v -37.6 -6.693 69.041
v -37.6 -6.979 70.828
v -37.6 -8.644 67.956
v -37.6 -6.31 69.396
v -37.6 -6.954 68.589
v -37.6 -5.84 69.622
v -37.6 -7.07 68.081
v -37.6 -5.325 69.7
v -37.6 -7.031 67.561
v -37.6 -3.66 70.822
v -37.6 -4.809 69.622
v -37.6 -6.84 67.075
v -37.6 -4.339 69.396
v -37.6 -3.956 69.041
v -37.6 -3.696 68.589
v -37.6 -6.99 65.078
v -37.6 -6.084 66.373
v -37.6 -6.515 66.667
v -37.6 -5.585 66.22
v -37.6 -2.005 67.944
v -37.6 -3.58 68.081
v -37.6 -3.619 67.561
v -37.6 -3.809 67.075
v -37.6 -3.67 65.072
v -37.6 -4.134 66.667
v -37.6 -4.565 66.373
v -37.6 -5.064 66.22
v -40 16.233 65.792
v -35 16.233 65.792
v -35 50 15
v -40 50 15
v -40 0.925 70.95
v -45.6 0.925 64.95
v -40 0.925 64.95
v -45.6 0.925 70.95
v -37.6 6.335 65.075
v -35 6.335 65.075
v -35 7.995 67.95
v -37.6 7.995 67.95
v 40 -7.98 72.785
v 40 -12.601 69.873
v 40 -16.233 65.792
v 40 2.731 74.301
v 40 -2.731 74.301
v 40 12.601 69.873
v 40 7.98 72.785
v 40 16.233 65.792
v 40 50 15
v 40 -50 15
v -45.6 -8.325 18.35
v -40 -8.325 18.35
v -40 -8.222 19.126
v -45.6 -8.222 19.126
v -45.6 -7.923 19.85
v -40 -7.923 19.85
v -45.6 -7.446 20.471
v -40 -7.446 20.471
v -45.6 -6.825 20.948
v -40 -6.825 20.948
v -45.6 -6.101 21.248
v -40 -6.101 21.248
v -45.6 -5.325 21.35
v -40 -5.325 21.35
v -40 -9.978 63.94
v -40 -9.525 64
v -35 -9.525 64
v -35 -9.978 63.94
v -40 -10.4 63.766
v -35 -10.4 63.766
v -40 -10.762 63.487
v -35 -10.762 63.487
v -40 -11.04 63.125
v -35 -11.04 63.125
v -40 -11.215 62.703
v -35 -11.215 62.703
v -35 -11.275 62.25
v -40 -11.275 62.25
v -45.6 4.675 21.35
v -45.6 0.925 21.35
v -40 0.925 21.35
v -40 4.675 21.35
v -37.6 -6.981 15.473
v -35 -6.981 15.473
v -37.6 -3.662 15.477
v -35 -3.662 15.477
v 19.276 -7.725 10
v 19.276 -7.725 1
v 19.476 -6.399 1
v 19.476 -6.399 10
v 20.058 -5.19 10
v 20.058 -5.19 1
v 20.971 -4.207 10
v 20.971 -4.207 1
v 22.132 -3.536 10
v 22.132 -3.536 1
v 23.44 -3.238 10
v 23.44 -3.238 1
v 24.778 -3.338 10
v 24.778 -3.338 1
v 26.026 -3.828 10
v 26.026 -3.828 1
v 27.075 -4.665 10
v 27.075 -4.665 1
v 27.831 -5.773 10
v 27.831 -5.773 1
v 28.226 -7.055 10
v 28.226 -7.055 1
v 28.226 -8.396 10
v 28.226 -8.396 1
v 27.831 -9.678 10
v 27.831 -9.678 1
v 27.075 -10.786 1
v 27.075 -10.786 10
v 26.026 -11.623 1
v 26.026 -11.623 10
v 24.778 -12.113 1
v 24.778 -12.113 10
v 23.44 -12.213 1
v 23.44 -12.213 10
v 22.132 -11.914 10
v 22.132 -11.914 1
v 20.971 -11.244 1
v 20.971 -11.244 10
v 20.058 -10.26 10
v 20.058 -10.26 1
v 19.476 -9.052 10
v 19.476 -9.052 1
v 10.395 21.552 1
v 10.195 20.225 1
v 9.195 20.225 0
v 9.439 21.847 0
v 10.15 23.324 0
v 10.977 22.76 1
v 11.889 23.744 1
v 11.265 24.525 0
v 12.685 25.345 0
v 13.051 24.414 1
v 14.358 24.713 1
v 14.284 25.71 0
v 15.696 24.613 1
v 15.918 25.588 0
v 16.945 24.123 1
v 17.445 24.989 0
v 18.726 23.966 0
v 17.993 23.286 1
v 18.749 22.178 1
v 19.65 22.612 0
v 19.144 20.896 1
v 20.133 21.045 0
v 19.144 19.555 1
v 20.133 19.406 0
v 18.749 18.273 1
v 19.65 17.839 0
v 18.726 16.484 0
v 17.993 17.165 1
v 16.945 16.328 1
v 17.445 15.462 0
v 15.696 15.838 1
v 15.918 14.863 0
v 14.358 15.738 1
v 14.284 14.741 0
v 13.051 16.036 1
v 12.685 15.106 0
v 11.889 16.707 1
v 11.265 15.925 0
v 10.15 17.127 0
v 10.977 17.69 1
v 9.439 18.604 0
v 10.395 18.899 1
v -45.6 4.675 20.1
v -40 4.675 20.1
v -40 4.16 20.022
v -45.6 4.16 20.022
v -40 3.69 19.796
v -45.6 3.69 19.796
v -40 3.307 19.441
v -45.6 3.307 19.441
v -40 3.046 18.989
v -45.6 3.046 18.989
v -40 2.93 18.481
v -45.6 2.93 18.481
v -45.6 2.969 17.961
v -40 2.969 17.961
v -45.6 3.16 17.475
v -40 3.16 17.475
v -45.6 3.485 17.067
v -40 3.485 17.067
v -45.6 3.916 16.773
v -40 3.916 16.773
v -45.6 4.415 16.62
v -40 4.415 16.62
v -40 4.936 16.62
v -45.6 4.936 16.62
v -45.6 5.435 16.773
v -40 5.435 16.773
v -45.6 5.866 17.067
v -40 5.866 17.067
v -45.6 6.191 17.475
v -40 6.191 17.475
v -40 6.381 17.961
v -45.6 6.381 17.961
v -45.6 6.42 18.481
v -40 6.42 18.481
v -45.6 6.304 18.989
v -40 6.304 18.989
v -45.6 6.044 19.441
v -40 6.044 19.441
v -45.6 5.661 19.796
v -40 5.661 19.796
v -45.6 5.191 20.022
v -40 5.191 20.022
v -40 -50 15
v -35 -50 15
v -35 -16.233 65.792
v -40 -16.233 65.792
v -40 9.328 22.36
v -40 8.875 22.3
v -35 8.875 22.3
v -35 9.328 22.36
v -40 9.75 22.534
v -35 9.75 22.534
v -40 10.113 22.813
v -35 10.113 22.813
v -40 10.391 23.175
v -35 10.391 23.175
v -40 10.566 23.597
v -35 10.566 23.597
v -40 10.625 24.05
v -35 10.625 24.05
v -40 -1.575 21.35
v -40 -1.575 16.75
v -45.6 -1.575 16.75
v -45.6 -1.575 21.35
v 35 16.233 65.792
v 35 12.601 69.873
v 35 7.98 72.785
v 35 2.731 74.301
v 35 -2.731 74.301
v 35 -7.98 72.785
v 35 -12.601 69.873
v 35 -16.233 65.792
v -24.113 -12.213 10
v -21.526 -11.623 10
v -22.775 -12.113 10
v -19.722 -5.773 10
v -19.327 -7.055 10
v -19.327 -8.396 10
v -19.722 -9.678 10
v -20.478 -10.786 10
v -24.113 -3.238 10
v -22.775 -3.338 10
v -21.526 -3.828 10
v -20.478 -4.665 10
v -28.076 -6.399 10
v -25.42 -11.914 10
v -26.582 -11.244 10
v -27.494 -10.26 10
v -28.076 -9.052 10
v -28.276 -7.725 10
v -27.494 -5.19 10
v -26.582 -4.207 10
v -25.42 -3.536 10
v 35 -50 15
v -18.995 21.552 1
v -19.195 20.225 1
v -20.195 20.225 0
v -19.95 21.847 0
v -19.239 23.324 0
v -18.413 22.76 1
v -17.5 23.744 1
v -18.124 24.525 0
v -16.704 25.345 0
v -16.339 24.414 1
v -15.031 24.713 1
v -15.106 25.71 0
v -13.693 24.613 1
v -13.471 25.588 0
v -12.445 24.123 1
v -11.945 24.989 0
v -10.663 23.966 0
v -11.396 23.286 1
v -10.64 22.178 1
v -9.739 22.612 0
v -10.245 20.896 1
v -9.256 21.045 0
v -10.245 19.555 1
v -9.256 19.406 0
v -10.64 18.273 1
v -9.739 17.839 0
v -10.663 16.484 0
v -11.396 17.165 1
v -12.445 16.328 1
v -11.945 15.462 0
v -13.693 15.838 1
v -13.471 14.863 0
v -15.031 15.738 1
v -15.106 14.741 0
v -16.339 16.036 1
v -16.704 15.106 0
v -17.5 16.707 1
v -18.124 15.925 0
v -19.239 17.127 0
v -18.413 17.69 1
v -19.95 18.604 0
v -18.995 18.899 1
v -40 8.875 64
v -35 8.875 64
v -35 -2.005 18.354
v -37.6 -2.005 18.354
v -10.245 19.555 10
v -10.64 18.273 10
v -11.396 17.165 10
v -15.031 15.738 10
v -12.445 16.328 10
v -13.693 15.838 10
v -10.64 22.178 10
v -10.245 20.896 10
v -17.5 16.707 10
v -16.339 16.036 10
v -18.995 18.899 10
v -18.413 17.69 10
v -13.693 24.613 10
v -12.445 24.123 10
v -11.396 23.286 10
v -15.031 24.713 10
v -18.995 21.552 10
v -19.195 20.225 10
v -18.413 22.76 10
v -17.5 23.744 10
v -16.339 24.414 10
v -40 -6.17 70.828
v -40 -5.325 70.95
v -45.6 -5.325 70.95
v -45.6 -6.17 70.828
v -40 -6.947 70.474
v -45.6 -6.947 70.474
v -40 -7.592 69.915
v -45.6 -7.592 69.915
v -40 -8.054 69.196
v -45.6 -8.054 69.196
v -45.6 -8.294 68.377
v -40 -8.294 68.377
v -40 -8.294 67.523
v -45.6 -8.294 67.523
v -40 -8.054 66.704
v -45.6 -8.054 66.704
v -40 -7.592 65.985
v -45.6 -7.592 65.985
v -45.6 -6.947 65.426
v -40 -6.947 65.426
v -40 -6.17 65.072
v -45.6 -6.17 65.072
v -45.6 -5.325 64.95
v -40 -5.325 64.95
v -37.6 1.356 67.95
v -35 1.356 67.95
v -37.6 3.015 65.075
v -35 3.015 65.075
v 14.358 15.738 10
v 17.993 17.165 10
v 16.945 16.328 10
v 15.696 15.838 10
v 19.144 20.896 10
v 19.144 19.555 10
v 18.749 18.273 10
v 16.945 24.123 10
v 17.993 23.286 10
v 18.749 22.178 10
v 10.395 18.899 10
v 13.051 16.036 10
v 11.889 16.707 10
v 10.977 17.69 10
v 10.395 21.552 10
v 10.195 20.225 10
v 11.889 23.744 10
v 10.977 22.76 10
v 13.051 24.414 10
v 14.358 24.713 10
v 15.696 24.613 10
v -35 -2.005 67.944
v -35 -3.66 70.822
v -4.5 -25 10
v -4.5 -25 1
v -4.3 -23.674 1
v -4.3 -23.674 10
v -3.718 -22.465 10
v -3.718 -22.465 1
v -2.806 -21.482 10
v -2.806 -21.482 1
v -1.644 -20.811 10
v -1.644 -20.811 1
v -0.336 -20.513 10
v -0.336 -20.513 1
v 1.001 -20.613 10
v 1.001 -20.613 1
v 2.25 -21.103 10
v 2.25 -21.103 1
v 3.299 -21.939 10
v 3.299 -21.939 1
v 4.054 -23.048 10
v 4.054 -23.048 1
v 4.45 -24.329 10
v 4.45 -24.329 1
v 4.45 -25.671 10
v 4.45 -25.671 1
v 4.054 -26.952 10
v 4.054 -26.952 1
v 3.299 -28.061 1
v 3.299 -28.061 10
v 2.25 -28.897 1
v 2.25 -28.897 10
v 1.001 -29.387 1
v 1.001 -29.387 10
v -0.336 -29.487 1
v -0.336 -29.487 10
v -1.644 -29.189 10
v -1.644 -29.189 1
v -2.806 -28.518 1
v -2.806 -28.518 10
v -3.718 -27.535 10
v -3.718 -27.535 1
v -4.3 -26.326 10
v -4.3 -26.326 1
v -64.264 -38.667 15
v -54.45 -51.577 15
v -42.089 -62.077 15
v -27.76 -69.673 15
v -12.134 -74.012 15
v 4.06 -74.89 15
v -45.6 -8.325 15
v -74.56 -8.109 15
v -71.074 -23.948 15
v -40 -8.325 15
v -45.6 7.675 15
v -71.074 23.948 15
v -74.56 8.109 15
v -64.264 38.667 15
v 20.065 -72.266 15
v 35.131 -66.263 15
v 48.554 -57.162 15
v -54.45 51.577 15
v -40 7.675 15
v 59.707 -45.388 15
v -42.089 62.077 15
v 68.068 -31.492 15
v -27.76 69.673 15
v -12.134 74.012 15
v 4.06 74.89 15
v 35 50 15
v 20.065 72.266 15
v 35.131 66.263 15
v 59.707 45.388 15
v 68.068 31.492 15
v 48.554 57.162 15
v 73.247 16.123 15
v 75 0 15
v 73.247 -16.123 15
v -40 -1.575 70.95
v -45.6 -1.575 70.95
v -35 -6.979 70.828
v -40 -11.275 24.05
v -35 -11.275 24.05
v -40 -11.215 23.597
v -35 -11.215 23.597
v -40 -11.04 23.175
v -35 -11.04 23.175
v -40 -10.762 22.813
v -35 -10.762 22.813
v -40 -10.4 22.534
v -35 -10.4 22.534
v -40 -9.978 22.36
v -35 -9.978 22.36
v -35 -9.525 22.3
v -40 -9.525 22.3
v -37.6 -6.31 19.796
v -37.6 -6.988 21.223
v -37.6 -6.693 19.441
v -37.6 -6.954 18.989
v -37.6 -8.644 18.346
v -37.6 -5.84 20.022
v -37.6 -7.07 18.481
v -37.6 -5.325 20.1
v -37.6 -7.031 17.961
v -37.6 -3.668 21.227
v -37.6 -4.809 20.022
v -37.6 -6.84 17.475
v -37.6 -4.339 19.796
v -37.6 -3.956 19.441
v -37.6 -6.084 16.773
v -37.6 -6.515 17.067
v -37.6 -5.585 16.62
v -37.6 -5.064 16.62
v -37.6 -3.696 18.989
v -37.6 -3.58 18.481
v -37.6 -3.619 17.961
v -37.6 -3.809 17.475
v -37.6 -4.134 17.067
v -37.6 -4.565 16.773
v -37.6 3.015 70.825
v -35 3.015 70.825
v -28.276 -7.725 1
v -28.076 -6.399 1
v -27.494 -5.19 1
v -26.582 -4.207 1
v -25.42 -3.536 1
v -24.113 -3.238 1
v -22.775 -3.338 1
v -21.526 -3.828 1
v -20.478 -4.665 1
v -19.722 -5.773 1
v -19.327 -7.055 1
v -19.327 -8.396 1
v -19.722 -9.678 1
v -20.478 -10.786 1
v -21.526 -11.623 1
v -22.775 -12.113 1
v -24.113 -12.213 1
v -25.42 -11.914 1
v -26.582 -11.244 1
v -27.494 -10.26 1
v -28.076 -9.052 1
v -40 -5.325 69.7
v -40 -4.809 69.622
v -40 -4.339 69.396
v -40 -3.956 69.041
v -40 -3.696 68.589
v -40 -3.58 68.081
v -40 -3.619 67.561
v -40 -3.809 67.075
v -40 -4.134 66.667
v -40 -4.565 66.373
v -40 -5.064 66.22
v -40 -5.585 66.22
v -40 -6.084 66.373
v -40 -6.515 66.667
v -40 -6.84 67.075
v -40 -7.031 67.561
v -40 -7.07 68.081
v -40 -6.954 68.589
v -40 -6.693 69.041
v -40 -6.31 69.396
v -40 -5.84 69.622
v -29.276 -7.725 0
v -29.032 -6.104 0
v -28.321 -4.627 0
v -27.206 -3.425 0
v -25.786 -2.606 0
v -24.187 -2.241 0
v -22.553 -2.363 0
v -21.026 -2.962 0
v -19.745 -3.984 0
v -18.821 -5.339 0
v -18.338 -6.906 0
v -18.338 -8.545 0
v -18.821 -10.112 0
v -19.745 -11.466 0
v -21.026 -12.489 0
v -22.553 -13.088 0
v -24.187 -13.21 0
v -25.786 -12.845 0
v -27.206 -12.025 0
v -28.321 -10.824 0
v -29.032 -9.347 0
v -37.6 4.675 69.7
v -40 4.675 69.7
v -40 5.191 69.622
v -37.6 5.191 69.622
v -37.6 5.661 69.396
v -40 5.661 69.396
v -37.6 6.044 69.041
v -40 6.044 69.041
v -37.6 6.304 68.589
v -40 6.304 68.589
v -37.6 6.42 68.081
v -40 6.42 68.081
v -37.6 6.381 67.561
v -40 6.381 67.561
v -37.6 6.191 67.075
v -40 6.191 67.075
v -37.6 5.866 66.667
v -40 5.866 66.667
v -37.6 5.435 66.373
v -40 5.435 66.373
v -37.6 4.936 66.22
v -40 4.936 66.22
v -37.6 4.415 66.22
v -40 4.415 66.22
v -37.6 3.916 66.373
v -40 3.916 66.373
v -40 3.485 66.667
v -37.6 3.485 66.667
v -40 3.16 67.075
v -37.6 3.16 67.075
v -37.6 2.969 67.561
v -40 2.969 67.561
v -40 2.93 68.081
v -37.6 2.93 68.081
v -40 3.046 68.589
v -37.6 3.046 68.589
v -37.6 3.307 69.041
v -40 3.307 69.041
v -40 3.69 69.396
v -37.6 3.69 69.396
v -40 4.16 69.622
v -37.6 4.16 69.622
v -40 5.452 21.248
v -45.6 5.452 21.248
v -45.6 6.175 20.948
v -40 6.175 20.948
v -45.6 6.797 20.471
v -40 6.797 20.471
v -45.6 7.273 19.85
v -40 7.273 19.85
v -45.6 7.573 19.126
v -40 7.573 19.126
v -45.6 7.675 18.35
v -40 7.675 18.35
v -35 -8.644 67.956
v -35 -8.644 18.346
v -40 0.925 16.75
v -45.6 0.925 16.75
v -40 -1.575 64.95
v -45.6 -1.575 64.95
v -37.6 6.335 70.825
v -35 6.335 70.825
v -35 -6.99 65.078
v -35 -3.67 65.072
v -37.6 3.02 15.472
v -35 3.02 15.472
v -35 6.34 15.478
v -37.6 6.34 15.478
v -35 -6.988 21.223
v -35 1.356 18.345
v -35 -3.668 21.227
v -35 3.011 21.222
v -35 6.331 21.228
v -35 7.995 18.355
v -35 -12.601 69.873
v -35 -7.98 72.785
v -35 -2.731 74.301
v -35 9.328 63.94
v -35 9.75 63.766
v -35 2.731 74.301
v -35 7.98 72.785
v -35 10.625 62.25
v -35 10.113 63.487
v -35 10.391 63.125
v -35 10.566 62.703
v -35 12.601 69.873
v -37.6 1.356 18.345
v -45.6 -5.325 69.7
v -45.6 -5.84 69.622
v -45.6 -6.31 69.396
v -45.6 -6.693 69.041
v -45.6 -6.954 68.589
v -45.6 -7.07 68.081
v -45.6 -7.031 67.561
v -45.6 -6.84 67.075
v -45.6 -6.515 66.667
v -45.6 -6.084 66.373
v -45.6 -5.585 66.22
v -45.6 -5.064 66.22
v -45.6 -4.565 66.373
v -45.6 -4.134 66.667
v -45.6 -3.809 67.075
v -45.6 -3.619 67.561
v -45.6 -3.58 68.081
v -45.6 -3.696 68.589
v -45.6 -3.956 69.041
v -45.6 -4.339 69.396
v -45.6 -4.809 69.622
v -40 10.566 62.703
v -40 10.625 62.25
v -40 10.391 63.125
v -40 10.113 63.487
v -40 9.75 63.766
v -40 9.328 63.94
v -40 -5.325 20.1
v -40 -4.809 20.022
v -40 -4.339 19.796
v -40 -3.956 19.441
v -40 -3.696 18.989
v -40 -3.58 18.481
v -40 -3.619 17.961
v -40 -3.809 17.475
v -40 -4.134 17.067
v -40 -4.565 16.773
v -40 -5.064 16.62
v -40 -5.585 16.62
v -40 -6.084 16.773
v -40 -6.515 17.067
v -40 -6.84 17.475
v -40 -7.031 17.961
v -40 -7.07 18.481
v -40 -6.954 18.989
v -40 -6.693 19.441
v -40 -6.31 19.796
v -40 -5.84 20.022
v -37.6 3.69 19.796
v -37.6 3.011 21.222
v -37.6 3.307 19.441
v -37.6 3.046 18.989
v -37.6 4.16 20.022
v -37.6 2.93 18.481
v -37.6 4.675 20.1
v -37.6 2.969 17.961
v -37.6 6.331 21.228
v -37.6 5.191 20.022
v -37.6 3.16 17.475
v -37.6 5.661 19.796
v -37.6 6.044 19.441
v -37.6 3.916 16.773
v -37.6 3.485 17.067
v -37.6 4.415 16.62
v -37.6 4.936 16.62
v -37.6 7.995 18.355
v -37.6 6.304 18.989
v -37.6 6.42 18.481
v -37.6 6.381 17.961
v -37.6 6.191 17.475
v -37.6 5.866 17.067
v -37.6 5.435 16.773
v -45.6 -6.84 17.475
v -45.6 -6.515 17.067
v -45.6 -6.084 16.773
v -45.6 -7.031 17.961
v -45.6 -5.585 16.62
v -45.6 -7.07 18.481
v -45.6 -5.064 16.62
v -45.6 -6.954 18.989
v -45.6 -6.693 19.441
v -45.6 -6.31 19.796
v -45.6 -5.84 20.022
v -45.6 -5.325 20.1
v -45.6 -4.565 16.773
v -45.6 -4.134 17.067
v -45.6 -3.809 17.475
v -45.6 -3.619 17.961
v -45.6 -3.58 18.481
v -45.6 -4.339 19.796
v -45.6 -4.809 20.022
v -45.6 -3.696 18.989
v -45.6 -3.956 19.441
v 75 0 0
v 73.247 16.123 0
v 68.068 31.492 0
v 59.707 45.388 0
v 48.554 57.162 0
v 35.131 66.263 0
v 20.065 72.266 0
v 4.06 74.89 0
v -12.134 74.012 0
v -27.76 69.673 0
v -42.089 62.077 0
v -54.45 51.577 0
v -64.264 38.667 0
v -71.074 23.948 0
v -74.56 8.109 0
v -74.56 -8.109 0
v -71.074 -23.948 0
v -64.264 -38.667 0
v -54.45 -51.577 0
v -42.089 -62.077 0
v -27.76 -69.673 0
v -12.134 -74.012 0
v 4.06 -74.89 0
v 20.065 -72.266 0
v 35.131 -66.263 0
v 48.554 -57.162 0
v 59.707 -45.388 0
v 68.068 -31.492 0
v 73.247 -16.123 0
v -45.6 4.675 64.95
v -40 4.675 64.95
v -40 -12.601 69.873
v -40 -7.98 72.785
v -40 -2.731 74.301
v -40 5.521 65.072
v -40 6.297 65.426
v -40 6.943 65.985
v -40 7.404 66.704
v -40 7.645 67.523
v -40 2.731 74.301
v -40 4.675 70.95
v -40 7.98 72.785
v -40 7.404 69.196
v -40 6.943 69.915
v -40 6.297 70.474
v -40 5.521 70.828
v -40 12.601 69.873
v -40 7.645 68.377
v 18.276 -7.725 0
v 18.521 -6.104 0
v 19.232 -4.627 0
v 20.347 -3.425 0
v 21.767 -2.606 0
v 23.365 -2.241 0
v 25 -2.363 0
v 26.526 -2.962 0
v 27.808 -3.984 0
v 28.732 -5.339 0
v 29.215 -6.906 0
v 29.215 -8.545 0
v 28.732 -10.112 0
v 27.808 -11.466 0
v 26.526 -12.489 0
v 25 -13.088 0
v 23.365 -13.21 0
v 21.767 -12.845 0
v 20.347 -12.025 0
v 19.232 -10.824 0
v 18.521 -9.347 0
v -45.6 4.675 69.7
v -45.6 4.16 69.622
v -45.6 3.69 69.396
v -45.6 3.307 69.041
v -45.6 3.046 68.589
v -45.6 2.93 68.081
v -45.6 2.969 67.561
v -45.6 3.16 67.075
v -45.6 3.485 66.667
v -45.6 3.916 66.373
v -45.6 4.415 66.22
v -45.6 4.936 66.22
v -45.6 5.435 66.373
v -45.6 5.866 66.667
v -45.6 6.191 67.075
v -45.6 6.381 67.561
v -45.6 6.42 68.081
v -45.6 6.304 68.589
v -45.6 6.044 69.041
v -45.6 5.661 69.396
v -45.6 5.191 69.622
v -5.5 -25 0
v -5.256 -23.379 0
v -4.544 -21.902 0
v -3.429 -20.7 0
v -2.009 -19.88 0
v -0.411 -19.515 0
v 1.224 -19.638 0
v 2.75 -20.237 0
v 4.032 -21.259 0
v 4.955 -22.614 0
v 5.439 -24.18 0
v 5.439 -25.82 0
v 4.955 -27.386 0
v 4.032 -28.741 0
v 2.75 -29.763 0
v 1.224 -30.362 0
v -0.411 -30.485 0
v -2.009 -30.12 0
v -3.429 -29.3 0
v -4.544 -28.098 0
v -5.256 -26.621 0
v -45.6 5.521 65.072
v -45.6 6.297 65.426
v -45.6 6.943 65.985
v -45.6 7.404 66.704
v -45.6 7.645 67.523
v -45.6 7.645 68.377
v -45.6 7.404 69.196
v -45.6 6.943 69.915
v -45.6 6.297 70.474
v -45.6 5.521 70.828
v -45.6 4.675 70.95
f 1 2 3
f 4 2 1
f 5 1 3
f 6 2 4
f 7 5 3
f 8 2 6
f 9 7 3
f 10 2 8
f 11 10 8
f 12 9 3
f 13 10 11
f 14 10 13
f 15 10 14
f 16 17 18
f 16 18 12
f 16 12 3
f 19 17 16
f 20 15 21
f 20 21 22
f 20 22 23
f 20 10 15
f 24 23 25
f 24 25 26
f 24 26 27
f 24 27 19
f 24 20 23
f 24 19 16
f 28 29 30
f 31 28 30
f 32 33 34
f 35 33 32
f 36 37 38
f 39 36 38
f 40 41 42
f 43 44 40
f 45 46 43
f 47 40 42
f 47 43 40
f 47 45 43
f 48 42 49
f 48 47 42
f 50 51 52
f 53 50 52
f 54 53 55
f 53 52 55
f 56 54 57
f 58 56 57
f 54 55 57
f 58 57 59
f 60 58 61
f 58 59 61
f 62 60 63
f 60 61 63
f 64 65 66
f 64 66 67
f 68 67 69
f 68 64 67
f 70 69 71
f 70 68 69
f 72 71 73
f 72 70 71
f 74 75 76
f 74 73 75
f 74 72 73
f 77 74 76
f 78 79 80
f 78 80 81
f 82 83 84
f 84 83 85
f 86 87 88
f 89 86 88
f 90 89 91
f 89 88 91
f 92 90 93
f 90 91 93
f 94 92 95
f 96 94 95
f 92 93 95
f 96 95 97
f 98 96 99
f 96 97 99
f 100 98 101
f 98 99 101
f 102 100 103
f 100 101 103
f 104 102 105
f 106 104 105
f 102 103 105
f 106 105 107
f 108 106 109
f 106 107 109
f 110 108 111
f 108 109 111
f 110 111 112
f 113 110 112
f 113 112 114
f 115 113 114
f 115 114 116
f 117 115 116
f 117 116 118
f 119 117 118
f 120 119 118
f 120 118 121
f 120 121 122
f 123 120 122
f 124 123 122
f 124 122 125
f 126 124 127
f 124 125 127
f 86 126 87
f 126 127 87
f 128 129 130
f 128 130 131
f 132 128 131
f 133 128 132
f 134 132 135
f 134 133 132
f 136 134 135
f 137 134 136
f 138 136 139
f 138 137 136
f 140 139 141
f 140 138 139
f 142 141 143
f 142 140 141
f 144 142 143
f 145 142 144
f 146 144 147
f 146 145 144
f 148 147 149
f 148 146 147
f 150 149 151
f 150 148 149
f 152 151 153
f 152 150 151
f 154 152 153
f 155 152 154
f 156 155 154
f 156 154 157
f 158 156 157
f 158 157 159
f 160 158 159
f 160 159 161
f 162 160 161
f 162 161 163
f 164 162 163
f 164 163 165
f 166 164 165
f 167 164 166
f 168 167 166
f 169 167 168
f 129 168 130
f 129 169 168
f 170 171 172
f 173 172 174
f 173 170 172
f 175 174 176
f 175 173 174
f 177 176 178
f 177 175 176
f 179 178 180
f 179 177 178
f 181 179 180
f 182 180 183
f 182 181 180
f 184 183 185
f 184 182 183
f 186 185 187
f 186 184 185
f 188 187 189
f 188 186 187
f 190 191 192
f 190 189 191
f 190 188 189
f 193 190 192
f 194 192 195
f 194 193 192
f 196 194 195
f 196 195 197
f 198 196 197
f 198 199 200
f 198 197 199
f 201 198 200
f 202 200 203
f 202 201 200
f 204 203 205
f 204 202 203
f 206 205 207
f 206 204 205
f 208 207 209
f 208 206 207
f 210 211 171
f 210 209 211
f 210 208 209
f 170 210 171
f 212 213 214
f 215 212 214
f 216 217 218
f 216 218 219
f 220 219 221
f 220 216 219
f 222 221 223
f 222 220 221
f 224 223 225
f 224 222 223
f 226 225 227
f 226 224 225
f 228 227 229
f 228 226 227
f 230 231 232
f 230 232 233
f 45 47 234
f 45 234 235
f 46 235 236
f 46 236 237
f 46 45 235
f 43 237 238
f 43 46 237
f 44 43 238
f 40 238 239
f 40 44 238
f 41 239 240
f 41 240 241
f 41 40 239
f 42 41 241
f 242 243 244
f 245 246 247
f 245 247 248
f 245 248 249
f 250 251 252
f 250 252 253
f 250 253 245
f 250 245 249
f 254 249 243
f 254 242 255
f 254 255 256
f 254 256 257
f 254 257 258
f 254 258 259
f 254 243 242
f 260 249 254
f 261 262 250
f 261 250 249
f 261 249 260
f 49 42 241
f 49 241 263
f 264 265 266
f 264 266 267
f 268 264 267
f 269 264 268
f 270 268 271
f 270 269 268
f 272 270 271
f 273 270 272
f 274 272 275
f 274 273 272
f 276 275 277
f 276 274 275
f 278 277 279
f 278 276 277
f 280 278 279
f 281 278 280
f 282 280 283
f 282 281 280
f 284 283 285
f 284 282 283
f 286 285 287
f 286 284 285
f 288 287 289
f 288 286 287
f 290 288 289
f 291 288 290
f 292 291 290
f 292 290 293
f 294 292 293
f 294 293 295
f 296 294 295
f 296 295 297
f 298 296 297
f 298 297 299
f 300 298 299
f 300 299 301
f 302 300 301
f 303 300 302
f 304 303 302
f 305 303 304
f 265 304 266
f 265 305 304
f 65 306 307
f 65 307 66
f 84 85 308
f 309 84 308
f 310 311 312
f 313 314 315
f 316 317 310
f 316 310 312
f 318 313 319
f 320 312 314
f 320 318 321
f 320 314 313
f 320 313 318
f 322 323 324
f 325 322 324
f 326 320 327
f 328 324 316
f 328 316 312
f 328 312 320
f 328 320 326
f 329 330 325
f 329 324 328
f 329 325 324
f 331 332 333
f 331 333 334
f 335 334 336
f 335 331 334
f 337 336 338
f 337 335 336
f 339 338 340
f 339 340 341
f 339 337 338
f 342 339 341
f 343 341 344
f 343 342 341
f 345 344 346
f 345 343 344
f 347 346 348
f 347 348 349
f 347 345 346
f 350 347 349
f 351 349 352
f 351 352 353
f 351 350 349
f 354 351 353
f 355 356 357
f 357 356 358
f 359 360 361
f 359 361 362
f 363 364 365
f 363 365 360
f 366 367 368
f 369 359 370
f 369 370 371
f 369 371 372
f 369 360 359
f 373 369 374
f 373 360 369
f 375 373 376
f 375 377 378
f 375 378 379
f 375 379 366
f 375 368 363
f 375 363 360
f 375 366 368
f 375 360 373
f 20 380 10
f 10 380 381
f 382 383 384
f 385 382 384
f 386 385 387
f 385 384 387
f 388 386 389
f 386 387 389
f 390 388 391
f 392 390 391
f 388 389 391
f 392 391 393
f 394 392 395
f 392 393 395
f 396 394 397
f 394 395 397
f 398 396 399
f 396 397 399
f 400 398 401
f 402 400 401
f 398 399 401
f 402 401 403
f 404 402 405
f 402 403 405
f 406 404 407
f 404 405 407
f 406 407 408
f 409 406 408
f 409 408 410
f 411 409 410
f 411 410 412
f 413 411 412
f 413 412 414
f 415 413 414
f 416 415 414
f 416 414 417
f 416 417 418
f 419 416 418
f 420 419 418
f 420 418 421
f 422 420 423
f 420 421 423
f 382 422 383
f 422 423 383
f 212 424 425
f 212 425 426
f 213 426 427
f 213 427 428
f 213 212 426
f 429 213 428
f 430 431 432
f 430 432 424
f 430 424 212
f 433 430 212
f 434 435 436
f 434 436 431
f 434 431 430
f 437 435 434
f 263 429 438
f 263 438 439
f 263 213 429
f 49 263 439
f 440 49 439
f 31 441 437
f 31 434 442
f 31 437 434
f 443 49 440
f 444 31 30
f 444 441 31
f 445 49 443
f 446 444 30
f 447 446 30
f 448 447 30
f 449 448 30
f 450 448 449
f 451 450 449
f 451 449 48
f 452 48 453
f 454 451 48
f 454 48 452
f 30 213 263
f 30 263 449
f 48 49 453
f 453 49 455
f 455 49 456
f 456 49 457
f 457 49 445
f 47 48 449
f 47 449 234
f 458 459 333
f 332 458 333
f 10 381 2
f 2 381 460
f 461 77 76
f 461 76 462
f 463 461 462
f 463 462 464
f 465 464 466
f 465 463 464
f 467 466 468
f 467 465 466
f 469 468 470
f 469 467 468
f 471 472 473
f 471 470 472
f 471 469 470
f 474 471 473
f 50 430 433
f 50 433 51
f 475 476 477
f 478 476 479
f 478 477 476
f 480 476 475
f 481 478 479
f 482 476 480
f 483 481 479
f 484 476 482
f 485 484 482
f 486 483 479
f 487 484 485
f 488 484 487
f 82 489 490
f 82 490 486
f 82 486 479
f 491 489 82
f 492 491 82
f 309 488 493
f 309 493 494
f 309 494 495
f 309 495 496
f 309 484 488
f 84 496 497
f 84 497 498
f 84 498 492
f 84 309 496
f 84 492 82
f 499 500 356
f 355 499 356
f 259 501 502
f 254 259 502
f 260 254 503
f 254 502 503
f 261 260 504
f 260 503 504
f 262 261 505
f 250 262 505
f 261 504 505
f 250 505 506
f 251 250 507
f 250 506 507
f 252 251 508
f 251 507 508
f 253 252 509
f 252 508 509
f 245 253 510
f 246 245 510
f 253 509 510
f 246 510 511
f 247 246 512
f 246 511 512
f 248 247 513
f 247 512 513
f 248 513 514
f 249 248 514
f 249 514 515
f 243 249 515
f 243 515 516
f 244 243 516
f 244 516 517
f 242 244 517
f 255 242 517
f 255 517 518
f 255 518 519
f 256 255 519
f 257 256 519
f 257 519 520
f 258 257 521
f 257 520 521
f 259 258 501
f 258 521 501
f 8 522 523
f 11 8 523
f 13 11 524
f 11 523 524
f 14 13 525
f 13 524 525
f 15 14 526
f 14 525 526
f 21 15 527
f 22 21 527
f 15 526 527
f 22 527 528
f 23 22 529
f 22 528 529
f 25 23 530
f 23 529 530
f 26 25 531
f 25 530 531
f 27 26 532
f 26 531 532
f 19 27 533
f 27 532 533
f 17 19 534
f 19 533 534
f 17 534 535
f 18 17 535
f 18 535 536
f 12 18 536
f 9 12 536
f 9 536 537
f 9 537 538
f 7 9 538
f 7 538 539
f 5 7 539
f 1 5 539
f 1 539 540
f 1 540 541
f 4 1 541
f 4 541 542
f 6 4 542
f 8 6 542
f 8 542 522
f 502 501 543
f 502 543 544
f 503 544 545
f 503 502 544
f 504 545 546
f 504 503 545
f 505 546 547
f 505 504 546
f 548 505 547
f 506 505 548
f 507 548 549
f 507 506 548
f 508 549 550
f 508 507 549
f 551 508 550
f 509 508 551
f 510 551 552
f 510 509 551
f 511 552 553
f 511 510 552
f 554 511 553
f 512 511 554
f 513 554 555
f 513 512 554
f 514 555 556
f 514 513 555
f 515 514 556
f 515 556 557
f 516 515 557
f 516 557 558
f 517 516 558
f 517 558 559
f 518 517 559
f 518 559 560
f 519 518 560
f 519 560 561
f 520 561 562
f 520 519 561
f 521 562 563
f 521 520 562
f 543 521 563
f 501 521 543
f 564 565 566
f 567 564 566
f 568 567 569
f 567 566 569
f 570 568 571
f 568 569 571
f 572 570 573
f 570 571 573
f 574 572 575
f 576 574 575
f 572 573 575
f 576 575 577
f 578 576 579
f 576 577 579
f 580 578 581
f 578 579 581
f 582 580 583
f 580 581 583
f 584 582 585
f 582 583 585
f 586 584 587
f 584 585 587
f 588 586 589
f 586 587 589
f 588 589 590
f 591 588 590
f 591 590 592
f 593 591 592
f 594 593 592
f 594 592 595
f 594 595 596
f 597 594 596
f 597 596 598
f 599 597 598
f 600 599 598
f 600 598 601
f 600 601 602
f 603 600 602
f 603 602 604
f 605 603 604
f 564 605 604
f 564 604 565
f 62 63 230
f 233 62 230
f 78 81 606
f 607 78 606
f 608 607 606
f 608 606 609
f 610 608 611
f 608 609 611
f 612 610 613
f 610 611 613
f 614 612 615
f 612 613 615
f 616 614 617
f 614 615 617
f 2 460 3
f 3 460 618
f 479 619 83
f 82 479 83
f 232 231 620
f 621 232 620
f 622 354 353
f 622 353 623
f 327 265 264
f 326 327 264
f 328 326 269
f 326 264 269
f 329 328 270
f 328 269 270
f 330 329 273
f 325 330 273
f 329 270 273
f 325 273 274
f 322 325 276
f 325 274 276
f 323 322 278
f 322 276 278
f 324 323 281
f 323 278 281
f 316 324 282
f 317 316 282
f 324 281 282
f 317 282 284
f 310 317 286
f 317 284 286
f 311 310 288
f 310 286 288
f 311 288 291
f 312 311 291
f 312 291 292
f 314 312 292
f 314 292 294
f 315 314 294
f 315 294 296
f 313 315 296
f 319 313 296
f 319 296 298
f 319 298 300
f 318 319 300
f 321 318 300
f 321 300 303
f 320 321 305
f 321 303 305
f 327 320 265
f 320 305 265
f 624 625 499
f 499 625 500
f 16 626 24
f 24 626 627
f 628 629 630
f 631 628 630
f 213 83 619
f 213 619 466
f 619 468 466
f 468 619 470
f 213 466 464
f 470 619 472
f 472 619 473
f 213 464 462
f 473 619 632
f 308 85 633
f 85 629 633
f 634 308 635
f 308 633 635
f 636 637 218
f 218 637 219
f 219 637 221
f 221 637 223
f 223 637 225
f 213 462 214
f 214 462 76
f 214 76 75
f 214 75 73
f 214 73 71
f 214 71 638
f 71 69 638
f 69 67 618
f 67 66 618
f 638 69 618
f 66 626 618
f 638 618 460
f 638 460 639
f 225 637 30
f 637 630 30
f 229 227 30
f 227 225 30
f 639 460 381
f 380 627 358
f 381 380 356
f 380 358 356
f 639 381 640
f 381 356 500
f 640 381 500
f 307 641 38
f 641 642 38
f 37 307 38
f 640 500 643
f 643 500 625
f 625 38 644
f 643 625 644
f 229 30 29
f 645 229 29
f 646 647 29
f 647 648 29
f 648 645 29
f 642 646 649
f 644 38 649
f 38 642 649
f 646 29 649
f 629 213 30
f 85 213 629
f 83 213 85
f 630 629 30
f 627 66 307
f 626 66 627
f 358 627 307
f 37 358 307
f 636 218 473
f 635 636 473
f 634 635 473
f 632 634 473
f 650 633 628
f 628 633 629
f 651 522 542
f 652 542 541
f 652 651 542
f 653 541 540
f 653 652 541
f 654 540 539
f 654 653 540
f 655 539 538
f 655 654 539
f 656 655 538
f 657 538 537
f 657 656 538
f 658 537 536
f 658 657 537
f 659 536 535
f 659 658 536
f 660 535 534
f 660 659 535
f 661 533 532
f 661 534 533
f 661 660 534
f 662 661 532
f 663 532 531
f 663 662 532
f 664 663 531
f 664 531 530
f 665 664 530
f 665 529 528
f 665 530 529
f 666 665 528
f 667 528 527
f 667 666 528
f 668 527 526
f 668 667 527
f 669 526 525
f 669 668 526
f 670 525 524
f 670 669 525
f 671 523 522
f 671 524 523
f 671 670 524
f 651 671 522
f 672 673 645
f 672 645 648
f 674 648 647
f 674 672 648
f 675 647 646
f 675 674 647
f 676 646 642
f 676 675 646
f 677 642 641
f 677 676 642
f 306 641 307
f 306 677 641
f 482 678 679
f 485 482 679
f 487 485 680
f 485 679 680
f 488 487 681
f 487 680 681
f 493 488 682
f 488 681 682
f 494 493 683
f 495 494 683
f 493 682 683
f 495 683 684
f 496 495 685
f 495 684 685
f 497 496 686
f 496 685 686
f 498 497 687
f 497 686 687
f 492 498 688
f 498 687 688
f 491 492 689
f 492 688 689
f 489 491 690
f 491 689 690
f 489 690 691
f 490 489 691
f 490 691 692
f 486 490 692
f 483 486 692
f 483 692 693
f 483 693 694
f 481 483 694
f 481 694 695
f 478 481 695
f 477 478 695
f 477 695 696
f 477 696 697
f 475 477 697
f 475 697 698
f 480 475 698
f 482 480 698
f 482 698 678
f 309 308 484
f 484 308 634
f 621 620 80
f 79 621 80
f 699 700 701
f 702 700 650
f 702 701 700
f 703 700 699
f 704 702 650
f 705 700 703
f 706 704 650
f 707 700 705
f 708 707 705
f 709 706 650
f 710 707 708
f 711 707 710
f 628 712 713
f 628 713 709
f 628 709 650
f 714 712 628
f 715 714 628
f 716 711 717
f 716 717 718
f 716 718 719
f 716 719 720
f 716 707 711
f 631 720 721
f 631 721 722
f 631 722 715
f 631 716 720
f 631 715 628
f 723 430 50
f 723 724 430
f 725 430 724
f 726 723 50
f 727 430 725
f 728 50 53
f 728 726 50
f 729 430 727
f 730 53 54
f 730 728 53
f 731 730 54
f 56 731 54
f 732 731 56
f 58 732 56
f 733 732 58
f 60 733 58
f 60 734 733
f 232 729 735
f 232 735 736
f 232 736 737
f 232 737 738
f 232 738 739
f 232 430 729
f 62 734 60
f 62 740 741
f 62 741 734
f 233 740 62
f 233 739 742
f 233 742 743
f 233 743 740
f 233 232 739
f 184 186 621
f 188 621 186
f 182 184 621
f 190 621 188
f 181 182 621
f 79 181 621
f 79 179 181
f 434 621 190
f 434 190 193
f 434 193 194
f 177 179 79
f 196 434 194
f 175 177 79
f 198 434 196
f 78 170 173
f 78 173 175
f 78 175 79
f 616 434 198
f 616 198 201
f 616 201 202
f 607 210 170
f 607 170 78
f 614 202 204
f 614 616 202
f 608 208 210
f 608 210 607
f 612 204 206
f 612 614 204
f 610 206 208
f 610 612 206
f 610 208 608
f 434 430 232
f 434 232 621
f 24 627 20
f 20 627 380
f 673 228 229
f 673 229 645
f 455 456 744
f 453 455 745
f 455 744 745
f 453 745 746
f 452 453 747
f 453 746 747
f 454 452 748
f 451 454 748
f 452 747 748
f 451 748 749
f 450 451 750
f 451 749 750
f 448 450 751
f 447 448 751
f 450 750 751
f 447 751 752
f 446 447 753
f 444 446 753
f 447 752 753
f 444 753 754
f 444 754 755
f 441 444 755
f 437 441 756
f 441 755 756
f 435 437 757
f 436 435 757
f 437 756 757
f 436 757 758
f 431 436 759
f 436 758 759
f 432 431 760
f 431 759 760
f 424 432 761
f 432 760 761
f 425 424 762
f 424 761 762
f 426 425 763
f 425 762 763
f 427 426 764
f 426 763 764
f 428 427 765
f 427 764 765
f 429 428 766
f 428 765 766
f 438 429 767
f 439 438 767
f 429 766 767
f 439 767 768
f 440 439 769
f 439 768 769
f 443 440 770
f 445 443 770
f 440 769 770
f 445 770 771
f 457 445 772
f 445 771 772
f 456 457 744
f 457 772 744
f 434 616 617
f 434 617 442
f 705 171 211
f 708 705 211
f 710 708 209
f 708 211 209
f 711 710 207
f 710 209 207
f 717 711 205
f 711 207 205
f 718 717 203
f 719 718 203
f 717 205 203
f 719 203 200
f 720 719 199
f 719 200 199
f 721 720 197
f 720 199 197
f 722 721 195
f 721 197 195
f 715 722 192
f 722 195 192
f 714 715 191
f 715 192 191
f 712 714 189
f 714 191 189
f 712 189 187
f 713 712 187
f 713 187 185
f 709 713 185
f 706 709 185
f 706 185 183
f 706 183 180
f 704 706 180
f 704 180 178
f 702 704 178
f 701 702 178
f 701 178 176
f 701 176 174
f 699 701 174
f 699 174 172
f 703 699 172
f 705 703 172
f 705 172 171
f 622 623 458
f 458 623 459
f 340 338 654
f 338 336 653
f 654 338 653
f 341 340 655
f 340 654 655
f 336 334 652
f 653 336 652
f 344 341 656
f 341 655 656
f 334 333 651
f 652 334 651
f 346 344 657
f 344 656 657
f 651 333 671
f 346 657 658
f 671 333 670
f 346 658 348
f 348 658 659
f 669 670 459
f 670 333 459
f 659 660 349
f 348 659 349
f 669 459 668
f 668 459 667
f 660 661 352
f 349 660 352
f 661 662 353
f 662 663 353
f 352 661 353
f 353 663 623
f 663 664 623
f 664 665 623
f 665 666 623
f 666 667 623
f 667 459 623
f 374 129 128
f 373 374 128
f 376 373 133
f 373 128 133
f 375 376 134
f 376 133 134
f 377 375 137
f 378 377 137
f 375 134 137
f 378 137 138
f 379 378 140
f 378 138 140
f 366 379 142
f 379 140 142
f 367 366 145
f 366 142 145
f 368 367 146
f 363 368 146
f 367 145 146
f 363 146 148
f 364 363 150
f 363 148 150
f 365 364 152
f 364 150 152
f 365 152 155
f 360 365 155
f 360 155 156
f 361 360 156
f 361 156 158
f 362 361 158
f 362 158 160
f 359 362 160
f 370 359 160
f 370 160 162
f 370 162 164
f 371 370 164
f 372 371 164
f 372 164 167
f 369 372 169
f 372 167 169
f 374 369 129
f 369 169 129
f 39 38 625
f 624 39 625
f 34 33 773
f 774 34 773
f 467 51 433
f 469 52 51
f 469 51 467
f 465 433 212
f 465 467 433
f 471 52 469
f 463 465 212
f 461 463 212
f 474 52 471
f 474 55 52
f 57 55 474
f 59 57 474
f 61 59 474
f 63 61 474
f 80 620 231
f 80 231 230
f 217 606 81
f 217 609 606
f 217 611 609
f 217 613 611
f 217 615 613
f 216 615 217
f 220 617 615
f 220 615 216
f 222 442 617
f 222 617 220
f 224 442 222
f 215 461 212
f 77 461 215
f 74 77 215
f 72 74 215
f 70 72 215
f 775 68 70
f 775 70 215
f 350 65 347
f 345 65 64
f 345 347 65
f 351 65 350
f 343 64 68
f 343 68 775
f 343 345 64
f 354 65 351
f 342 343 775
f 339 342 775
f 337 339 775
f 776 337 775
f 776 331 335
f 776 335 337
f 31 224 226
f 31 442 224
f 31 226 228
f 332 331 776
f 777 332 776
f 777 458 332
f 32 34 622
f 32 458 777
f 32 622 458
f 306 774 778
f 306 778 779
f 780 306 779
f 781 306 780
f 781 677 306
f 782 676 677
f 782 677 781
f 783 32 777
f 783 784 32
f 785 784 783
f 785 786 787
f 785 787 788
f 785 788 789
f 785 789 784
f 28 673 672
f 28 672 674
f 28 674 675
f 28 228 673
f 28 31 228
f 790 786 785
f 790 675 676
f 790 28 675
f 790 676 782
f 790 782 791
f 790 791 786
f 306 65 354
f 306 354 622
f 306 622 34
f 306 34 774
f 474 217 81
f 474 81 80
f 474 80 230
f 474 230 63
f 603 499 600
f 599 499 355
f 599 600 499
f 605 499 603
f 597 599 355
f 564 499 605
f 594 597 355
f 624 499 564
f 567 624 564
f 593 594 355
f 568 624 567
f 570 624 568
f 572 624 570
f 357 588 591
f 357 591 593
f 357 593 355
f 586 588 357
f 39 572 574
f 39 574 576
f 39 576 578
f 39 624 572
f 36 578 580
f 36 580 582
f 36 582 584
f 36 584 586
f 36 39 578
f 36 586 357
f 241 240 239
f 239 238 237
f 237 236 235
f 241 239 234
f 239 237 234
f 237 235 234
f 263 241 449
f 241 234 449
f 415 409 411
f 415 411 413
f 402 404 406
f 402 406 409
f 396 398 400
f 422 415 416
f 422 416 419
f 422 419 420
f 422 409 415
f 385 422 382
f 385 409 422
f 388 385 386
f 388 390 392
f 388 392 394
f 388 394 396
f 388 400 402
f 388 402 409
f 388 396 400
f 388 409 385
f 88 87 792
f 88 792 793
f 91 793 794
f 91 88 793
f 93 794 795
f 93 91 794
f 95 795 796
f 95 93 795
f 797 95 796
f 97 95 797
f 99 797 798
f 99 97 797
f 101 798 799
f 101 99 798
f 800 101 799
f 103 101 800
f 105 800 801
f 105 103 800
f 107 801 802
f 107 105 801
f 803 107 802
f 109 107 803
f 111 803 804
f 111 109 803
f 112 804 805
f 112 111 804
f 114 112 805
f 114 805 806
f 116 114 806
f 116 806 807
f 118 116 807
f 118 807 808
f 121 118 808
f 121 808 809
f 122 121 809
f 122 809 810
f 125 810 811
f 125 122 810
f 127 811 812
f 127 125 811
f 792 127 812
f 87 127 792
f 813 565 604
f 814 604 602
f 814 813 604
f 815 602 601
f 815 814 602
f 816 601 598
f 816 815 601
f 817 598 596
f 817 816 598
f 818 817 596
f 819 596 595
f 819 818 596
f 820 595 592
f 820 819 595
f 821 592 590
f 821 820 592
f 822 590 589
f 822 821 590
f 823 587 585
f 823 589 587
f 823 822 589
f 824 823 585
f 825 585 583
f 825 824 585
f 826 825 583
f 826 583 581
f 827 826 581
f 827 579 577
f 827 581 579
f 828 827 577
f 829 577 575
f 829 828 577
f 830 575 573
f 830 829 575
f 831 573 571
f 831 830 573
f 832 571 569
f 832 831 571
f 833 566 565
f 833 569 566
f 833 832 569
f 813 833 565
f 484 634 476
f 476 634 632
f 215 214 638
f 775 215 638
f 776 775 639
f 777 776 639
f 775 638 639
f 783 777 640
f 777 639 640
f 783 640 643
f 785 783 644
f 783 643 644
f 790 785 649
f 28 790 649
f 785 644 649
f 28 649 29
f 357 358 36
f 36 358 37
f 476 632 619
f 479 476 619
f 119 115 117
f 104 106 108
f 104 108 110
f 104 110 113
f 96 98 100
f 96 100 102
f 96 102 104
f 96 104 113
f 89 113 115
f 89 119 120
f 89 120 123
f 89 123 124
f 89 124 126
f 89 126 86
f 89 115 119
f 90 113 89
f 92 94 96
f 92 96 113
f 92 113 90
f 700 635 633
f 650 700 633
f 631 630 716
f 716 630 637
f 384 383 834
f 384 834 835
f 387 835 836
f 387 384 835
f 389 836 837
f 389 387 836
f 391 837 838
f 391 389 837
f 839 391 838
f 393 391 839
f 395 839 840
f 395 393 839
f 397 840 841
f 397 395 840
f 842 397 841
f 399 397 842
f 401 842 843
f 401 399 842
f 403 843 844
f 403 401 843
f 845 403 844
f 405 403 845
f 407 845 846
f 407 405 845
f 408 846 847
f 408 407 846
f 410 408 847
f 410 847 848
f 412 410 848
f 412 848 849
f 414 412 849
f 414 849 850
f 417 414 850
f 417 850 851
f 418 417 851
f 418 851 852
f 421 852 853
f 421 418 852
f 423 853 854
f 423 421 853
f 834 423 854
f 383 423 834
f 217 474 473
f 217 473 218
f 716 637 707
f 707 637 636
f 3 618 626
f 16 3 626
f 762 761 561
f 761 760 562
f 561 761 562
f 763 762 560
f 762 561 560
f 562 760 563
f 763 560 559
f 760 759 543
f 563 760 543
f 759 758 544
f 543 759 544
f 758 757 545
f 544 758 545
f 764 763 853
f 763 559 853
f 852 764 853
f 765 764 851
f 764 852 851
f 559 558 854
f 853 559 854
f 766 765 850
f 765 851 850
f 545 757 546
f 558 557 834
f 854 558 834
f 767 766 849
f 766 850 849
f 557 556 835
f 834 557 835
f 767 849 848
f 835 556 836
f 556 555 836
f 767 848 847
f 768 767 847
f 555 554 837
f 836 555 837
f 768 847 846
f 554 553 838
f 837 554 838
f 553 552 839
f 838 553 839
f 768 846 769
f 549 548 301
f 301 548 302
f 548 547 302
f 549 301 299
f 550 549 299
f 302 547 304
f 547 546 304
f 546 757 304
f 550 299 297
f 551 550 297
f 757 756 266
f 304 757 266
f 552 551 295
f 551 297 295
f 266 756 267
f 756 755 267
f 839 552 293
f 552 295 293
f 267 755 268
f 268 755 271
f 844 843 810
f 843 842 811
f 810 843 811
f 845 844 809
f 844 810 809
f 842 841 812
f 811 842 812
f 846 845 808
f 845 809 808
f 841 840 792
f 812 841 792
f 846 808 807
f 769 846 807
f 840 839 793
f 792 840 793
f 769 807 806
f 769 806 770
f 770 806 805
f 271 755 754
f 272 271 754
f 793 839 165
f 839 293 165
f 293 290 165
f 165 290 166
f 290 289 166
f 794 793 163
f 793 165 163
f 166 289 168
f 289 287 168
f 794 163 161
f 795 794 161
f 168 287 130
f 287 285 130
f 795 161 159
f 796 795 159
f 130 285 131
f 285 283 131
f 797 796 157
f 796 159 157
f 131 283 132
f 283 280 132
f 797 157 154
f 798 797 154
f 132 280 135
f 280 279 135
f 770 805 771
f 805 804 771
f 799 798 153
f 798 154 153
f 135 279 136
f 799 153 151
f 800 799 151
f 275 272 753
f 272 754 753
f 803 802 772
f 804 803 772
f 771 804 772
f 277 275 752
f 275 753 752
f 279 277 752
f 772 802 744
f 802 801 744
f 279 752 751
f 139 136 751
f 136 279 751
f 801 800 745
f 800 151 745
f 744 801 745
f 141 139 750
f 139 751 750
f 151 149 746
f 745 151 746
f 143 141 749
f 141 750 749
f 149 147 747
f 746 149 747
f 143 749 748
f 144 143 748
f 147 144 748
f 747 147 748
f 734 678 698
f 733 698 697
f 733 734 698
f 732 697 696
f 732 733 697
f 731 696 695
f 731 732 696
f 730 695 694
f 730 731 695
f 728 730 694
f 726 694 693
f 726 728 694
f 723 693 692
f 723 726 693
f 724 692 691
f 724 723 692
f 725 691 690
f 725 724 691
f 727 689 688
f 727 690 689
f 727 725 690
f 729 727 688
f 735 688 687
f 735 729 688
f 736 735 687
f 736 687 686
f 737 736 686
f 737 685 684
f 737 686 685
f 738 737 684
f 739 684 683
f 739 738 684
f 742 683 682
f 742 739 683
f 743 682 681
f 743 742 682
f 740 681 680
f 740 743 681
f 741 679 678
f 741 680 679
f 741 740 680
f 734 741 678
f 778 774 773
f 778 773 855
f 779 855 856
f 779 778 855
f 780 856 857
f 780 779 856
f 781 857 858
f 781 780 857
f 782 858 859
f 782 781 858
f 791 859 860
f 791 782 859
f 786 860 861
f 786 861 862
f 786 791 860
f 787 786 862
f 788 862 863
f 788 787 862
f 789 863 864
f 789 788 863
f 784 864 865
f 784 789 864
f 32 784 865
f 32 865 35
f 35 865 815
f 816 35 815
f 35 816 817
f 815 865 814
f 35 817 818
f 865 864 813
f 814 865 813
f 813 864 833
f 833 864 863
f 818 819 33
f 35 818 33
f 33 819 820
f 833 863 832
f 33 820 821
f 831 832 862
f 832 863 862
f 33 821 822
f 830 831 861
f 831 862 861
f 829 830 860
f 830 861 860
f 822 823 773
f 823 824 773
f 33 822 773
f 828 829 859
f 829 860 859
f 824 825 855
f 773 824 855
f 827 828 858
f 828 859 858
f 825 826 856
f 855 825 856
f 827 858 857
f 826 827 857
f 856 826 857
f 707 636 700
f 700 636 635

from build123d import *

# Parameters (mm, degrees)
SKETCH1_R           = 75
BASE_PLATE_DEPTH    = 15
SKETCH2_R           = 4.5
DRIVE_HOLES_DEPTH   = 10
CHAMFER1_SIZE       = 1
BASE_START          = 40
BASE_FIN_DEPTH      = 5
BASE_START_2        = 70
BASE_FIN_2_DEPTH    = 5
CUT_EXTRUDE1_REACH  = 158.203
CUT_EXTRUDE2_REACH  = 158.203
SKETCH7_R           = 1.75
BOSS_EXTRUDE1_DEPTH = 5.6
CUT_EXTRUDE3_START  = -5.6
SKETCH9_R           = 1.75
CUT_EXTRUDE3_DEPTH  = 5.6
SKETCH10_W          = 4.6
SKETCH10_H          = 2.5
SKETCH10_W_2        = 6
CUT_EXTRUDE4_DEPTH  = 5.6
CUT_EXTRUDE5_DEPTH  = 2.6


with BuildPart() as part:
    # Sketch1 → Base Plate (new body)
    with BuildSketch(Plane.XY):
        Circle(SKETCH1_R)
    extrude(amount=BASE_PLATE_DEPTH)

    # Sketch2 → Drive Holes (cut)
    with BuildSketch(Plane(origin=(0, 0, 0), x_dir=(-1, 0, 0), z_dir=(0, 0, -1))):
        with Locations((0, -25)):
            Circle(SKETCH2_R)
        with Locations((-23.776412907, -7.725424859)):
            Circle(SKETCH2_R)
        with Locations((-14.694631307, 20.225424859)):
            Circle(SKETCH2_R)
        with Locations((14.694631307, 20.225424859)):
            Circle(SKETCH2_R)
        with Locations((23.776412907, -7.725424859)):
            Circle(SKETCH2_R)
    extrude(amount=-DRIVE_HOLES_DEPTH, mode=Mode.SUBTRACT)

    # Chamfer1
    chamfer1_edges = [part.edges().sort_by_distance(p)[0] for p in [
        (28.276412907, -7.725424859, 0),
        (19.194631307, 20.225424859, 0),
        (-10.194631307, 20.225424859, 0),
        (-19.276412907, -7.725424859, 0),
        (4.5, -25, 0),
    ]]
    chamfer(chamfer1_edges, length=CHAMFER1_SIZE)

    # Sketch4 → Base Fin (add)
    with BuildSketch(Plane(origin=(0, 0, 0), x_dir=(0, 0, -1), z_dir=(1, 0, 0)).offset(BASE_START)):
        with BuildLine():
            Line((-15, 50), (-65.791986374, 16.233382914))
            ThreePointArc((-65.791986374, 16.233382914), (-74.493324261, 0), (-65.791986374, -16.233382914))
            Line((-65.791986374, -16.233382914), (-15, -50))
            Line((-15, -50), (-15, 50))
        make_face()
    extrude(amount=-BASE_FIN_DEPTH)

    # Sketch5 → Base Fin 2 (add)
    with BuildSketch(Plane.ZY.offset(-35).offset(BASE_START_2)):
        with BuildLine():
            Line((15, 50), (15, -50))
            Line((15, -50), (65.791986374, -16.233382914))
            ThreePointArc((65.791986374, -16.233382914), (74.493324261, 0), (65.791986374, 16.233382914))
            Line((65.791986374, 16.233382914), (15, 50))
        make_face()
    extrude(amount=BASE_FIN_2_DEPTH)

    # Sketch6 → Cut-Extrude1 (cut, up to next)
    with BuildSketch(Plane.ZY.offset(40), mode=Mode.PRIVATE) as cut_extrude1_sk1:
        with BuildLine():
            Line((64, 8.875345998), (64, -9.524654002))
            ThreePointArc((64, -9.524654002), (63.487436867, -10.762090869), (62.25, -11.274654002))
            Line((62.25, -11.274654002), (24.05, -11.274654002))
            ThreePointArc((24.05, -11.274654002), (22.812563133, -10.762090869), (22.3, -9.524654002))
            Line((22.3, -9.524654002), (22.3, 8.875345998))
            ThreePointArc((22.3, 8.875345998), (22.812563133, 10.112782865), (24.05, 10.625345998))
            Line((24.05, 10.625345998), (62.25, 10.625345998))
            ThreePointArc((62.25, 10.625345998), (63.487436867, 10.112782865), (64, 8.875345998))
        make_face()
    cut_extrude1_tool1 = extrude(cut_extrude1_sk1.sketch, amount=-CUT_EXTRUDE1_REACH, mode=Mode.PRIVATE) & part.part
    add(cut_extrude1_tool1.solids().sort_by_distance((-40, -0.324654, 43.15))[0], mode=Mode.SUBTRACT)

    # Sketch7 → Cut-Extrude2 (cut, up to next)
    with BuildSketch(Plane.ZY.offset(40), mode=Mode.PRIVATE) as cut_extrude2_sk1:
        with Locations((18.35, 4.675345998)):
            Circle(SKETCH7_R)
    cut_extrude2_tool1 = extrude(cut_extrude2_sk1.sketch, amount=-CUT_EXTRUDE2_REACH, mode=Mode.PRIVATE) & part.part
    # Sketch7 → Cut-Extrude2 (cut, up to next)
    with BuildSketch(Plane.ZY.offset(40), mode=Mode.PRIVATE) as cut_extrude2_sk2:
        with Locations((18.35, -5.324654002)):
            Circle(SKETCH7_R)
    cut_extrude2_tool2 = extrude(cut_extrude2_sk2.sketch, amount=-CUT_EXTRUDE2_REACH, mode=Mode.PRIVATE) & part.part
    # Sketch7 → Cut-Extrude2 (cut, up to next)
    with BuildSketch(Plane.ZY.offset(40), mode=Mode.PRIVATE) as cut_extrude2_sk3:
        with Locations((67.95, -5.324654002)):
            Circle(SKETCH7_R)
    cut_extrude2_tool3 = extrude(cut_extrude2_sk3.sketch, amount=-CUT_EXTRUDE2_REACH, mode=Mode.PRIVATE) & part.part
    # Sketch7 → Cut-Extrude2 (cut, up to next)
    with BuildSketch(Plane.ZY.offset(40), mode=Mode.PRIVATE) as cut_extrude2_sk4:
        with Locations((67.95, 4.675345998)):
            Circle(SKETCH7_R)
    cut_extrude2_tool4 = extrude(cut_extrude2_sk4.sketch, amount=-CUT_EXTRUDE2_REACH, mode=Mode.PRIVATE) & part.part
    add(cut_extrude2_tool1.solids().sort_by_distance((-40, 4.675346, 18.35))[0], mode=Mode.SUBTRACT)
    add(cut_extrude2_tool2.solids().sort_by_distance((-40, -5.324654, 18.35))[0], mode=Mode.SUBTRACT)
    add(cut_extrude2_tool3.solids().sort_by_distance((-40, -5.324654, 67.95))[0], mode=Mode.SUBTRACT)
    add(cut_extrude2_tool4.solids().sort_by_distance((-40, 4.675346, 67.95))[0], mode=Mode.SUBTRACT)

    # Sketch8 → Boss-Extrude1 (add)
    with BuildSketch(Plane.ZY.offset(40)):
        with BuildLine():
            Line((70.95, 4.675345998), (70.95, -5.324654002))
            ThreePointArc((70.95, -5.324654002), (67.95, -8.324654002), (64.95, -5.324654002))
            Line((64.95, -5.324654002), (64.95, 4.675345998))
            ThreePointArc((64.95, 4.675345998), (67.95, 7.675345998), (70.95, 4.675345998))
        make_face()
        with BuildLine():
            Line((15, 7.675345998), (15, 0))
            Line((15, 0), (15, -8.324654002))
            Line((15, -8.324654002), (18.35, -8.324654002))
            ThreePointArc((18.35, -8.324654002), (20.471320344, -7.445974346), (21.35, -5.324654002))
            Line((21.35, -5.324654002), (21.35, 4.675345998))
            ThreePointArc((21.35, 4.675345998), (20.471320344, 6.796666341), (18.35, 7.675345998))
            Line((18.35, 7.675345998), (15, 7.675345998))
        make_face()
    extrude(amount=BOSS_EXTRUDE1_DEPTH)

    # Sketch9 → Cut-Extrude3 (cut)
    with BuildSketch(Plane(origin=(-40, 0, 0), x_dir=(0, 0, -1), z_dir=(1, 0, 0)).offset(CUT_EXTRUDE3_START)):
        with Locations(Location((-67.95, -5.324654002, 0), (0, 0, 180))):
            Circle(SKETCH9_R)
        with Locations(Location((-67.95, 4.675345998, 0), (0, 0, 180))):
            Circle(SKETCH9_R)
        with Locations(Location((-18.35, -5.324654002, 0), (0, 0, 180))):
            Circle(SKETCH9_R)
        with Locations(Location((-18.35, 4.675345998, 0), (0, 0, 180))):
            Circle(SKETCH9_R)
    extrude(amount=CUT_EXTRUDE3_DEPTH, mode=Mode.SUBTRACT)

    # Sketch10 → Cut-Extrude4 (cut)
    with BuildSketch(Plane.ZY.offset(45.6)):
        with Locations((19.05, -0.324654002)):
            Rectangle(SKETCH10_W, SKETCH10_H)
        with Locations((67.95, -0.324654002)):
            Rectangle(SKETCH10_W_2, SKETCH10_H)
    extrude(amount=-CUT_EXTRUDE4_DEPTH, mode=Mode.SUBTRACT)

    # Sketch11 → Cut-Extrude5 (cut)
    with BuildSketch(Plane(origin=(-35, 0, 0), x_dir=(0, 0, -1), z_dir=(1, 0, 0))):
        Polygon((-67.94416086, -2.00489509), (-70.822075983, -3.659717702), (-70.827915123, -6.979476615), (-67.95583914, -8.644412915), (-65.077924017, -6.989590302), (-65.072084877, -3.66983139), align=None)
        Polygon((-67.95, 7.995110046), (-70.825, 6.335228022), (-70.825, 3.015463974), (-67.95, 1.35558195), (-65.075, 3.015463974), (-65.075, 6.335228022), align=None)
        Polygon((-18.353543237, -2.004891845), (-21.226769981, -3.667841457), (-21.223226744, -6.987603614), (-18.346456763, -8.644416159), (-15.473230019, -6.981466547), (-15.476773256, -3.66170439), align=None)
        Polygon((-18.355430794, 7.995105604), (-21.22771155, 6.330522595), (-21.222280756, 3.010762989), (-18.344569206, 1.355586392), (-15.47228845, 3.020169401), (-15.477719244, 6.339929006), align=None)
    extrude(amount=-CUT_EXTRUDE5_DEPTH, mode=Mode.SUBTRACT)


solid = part.part
